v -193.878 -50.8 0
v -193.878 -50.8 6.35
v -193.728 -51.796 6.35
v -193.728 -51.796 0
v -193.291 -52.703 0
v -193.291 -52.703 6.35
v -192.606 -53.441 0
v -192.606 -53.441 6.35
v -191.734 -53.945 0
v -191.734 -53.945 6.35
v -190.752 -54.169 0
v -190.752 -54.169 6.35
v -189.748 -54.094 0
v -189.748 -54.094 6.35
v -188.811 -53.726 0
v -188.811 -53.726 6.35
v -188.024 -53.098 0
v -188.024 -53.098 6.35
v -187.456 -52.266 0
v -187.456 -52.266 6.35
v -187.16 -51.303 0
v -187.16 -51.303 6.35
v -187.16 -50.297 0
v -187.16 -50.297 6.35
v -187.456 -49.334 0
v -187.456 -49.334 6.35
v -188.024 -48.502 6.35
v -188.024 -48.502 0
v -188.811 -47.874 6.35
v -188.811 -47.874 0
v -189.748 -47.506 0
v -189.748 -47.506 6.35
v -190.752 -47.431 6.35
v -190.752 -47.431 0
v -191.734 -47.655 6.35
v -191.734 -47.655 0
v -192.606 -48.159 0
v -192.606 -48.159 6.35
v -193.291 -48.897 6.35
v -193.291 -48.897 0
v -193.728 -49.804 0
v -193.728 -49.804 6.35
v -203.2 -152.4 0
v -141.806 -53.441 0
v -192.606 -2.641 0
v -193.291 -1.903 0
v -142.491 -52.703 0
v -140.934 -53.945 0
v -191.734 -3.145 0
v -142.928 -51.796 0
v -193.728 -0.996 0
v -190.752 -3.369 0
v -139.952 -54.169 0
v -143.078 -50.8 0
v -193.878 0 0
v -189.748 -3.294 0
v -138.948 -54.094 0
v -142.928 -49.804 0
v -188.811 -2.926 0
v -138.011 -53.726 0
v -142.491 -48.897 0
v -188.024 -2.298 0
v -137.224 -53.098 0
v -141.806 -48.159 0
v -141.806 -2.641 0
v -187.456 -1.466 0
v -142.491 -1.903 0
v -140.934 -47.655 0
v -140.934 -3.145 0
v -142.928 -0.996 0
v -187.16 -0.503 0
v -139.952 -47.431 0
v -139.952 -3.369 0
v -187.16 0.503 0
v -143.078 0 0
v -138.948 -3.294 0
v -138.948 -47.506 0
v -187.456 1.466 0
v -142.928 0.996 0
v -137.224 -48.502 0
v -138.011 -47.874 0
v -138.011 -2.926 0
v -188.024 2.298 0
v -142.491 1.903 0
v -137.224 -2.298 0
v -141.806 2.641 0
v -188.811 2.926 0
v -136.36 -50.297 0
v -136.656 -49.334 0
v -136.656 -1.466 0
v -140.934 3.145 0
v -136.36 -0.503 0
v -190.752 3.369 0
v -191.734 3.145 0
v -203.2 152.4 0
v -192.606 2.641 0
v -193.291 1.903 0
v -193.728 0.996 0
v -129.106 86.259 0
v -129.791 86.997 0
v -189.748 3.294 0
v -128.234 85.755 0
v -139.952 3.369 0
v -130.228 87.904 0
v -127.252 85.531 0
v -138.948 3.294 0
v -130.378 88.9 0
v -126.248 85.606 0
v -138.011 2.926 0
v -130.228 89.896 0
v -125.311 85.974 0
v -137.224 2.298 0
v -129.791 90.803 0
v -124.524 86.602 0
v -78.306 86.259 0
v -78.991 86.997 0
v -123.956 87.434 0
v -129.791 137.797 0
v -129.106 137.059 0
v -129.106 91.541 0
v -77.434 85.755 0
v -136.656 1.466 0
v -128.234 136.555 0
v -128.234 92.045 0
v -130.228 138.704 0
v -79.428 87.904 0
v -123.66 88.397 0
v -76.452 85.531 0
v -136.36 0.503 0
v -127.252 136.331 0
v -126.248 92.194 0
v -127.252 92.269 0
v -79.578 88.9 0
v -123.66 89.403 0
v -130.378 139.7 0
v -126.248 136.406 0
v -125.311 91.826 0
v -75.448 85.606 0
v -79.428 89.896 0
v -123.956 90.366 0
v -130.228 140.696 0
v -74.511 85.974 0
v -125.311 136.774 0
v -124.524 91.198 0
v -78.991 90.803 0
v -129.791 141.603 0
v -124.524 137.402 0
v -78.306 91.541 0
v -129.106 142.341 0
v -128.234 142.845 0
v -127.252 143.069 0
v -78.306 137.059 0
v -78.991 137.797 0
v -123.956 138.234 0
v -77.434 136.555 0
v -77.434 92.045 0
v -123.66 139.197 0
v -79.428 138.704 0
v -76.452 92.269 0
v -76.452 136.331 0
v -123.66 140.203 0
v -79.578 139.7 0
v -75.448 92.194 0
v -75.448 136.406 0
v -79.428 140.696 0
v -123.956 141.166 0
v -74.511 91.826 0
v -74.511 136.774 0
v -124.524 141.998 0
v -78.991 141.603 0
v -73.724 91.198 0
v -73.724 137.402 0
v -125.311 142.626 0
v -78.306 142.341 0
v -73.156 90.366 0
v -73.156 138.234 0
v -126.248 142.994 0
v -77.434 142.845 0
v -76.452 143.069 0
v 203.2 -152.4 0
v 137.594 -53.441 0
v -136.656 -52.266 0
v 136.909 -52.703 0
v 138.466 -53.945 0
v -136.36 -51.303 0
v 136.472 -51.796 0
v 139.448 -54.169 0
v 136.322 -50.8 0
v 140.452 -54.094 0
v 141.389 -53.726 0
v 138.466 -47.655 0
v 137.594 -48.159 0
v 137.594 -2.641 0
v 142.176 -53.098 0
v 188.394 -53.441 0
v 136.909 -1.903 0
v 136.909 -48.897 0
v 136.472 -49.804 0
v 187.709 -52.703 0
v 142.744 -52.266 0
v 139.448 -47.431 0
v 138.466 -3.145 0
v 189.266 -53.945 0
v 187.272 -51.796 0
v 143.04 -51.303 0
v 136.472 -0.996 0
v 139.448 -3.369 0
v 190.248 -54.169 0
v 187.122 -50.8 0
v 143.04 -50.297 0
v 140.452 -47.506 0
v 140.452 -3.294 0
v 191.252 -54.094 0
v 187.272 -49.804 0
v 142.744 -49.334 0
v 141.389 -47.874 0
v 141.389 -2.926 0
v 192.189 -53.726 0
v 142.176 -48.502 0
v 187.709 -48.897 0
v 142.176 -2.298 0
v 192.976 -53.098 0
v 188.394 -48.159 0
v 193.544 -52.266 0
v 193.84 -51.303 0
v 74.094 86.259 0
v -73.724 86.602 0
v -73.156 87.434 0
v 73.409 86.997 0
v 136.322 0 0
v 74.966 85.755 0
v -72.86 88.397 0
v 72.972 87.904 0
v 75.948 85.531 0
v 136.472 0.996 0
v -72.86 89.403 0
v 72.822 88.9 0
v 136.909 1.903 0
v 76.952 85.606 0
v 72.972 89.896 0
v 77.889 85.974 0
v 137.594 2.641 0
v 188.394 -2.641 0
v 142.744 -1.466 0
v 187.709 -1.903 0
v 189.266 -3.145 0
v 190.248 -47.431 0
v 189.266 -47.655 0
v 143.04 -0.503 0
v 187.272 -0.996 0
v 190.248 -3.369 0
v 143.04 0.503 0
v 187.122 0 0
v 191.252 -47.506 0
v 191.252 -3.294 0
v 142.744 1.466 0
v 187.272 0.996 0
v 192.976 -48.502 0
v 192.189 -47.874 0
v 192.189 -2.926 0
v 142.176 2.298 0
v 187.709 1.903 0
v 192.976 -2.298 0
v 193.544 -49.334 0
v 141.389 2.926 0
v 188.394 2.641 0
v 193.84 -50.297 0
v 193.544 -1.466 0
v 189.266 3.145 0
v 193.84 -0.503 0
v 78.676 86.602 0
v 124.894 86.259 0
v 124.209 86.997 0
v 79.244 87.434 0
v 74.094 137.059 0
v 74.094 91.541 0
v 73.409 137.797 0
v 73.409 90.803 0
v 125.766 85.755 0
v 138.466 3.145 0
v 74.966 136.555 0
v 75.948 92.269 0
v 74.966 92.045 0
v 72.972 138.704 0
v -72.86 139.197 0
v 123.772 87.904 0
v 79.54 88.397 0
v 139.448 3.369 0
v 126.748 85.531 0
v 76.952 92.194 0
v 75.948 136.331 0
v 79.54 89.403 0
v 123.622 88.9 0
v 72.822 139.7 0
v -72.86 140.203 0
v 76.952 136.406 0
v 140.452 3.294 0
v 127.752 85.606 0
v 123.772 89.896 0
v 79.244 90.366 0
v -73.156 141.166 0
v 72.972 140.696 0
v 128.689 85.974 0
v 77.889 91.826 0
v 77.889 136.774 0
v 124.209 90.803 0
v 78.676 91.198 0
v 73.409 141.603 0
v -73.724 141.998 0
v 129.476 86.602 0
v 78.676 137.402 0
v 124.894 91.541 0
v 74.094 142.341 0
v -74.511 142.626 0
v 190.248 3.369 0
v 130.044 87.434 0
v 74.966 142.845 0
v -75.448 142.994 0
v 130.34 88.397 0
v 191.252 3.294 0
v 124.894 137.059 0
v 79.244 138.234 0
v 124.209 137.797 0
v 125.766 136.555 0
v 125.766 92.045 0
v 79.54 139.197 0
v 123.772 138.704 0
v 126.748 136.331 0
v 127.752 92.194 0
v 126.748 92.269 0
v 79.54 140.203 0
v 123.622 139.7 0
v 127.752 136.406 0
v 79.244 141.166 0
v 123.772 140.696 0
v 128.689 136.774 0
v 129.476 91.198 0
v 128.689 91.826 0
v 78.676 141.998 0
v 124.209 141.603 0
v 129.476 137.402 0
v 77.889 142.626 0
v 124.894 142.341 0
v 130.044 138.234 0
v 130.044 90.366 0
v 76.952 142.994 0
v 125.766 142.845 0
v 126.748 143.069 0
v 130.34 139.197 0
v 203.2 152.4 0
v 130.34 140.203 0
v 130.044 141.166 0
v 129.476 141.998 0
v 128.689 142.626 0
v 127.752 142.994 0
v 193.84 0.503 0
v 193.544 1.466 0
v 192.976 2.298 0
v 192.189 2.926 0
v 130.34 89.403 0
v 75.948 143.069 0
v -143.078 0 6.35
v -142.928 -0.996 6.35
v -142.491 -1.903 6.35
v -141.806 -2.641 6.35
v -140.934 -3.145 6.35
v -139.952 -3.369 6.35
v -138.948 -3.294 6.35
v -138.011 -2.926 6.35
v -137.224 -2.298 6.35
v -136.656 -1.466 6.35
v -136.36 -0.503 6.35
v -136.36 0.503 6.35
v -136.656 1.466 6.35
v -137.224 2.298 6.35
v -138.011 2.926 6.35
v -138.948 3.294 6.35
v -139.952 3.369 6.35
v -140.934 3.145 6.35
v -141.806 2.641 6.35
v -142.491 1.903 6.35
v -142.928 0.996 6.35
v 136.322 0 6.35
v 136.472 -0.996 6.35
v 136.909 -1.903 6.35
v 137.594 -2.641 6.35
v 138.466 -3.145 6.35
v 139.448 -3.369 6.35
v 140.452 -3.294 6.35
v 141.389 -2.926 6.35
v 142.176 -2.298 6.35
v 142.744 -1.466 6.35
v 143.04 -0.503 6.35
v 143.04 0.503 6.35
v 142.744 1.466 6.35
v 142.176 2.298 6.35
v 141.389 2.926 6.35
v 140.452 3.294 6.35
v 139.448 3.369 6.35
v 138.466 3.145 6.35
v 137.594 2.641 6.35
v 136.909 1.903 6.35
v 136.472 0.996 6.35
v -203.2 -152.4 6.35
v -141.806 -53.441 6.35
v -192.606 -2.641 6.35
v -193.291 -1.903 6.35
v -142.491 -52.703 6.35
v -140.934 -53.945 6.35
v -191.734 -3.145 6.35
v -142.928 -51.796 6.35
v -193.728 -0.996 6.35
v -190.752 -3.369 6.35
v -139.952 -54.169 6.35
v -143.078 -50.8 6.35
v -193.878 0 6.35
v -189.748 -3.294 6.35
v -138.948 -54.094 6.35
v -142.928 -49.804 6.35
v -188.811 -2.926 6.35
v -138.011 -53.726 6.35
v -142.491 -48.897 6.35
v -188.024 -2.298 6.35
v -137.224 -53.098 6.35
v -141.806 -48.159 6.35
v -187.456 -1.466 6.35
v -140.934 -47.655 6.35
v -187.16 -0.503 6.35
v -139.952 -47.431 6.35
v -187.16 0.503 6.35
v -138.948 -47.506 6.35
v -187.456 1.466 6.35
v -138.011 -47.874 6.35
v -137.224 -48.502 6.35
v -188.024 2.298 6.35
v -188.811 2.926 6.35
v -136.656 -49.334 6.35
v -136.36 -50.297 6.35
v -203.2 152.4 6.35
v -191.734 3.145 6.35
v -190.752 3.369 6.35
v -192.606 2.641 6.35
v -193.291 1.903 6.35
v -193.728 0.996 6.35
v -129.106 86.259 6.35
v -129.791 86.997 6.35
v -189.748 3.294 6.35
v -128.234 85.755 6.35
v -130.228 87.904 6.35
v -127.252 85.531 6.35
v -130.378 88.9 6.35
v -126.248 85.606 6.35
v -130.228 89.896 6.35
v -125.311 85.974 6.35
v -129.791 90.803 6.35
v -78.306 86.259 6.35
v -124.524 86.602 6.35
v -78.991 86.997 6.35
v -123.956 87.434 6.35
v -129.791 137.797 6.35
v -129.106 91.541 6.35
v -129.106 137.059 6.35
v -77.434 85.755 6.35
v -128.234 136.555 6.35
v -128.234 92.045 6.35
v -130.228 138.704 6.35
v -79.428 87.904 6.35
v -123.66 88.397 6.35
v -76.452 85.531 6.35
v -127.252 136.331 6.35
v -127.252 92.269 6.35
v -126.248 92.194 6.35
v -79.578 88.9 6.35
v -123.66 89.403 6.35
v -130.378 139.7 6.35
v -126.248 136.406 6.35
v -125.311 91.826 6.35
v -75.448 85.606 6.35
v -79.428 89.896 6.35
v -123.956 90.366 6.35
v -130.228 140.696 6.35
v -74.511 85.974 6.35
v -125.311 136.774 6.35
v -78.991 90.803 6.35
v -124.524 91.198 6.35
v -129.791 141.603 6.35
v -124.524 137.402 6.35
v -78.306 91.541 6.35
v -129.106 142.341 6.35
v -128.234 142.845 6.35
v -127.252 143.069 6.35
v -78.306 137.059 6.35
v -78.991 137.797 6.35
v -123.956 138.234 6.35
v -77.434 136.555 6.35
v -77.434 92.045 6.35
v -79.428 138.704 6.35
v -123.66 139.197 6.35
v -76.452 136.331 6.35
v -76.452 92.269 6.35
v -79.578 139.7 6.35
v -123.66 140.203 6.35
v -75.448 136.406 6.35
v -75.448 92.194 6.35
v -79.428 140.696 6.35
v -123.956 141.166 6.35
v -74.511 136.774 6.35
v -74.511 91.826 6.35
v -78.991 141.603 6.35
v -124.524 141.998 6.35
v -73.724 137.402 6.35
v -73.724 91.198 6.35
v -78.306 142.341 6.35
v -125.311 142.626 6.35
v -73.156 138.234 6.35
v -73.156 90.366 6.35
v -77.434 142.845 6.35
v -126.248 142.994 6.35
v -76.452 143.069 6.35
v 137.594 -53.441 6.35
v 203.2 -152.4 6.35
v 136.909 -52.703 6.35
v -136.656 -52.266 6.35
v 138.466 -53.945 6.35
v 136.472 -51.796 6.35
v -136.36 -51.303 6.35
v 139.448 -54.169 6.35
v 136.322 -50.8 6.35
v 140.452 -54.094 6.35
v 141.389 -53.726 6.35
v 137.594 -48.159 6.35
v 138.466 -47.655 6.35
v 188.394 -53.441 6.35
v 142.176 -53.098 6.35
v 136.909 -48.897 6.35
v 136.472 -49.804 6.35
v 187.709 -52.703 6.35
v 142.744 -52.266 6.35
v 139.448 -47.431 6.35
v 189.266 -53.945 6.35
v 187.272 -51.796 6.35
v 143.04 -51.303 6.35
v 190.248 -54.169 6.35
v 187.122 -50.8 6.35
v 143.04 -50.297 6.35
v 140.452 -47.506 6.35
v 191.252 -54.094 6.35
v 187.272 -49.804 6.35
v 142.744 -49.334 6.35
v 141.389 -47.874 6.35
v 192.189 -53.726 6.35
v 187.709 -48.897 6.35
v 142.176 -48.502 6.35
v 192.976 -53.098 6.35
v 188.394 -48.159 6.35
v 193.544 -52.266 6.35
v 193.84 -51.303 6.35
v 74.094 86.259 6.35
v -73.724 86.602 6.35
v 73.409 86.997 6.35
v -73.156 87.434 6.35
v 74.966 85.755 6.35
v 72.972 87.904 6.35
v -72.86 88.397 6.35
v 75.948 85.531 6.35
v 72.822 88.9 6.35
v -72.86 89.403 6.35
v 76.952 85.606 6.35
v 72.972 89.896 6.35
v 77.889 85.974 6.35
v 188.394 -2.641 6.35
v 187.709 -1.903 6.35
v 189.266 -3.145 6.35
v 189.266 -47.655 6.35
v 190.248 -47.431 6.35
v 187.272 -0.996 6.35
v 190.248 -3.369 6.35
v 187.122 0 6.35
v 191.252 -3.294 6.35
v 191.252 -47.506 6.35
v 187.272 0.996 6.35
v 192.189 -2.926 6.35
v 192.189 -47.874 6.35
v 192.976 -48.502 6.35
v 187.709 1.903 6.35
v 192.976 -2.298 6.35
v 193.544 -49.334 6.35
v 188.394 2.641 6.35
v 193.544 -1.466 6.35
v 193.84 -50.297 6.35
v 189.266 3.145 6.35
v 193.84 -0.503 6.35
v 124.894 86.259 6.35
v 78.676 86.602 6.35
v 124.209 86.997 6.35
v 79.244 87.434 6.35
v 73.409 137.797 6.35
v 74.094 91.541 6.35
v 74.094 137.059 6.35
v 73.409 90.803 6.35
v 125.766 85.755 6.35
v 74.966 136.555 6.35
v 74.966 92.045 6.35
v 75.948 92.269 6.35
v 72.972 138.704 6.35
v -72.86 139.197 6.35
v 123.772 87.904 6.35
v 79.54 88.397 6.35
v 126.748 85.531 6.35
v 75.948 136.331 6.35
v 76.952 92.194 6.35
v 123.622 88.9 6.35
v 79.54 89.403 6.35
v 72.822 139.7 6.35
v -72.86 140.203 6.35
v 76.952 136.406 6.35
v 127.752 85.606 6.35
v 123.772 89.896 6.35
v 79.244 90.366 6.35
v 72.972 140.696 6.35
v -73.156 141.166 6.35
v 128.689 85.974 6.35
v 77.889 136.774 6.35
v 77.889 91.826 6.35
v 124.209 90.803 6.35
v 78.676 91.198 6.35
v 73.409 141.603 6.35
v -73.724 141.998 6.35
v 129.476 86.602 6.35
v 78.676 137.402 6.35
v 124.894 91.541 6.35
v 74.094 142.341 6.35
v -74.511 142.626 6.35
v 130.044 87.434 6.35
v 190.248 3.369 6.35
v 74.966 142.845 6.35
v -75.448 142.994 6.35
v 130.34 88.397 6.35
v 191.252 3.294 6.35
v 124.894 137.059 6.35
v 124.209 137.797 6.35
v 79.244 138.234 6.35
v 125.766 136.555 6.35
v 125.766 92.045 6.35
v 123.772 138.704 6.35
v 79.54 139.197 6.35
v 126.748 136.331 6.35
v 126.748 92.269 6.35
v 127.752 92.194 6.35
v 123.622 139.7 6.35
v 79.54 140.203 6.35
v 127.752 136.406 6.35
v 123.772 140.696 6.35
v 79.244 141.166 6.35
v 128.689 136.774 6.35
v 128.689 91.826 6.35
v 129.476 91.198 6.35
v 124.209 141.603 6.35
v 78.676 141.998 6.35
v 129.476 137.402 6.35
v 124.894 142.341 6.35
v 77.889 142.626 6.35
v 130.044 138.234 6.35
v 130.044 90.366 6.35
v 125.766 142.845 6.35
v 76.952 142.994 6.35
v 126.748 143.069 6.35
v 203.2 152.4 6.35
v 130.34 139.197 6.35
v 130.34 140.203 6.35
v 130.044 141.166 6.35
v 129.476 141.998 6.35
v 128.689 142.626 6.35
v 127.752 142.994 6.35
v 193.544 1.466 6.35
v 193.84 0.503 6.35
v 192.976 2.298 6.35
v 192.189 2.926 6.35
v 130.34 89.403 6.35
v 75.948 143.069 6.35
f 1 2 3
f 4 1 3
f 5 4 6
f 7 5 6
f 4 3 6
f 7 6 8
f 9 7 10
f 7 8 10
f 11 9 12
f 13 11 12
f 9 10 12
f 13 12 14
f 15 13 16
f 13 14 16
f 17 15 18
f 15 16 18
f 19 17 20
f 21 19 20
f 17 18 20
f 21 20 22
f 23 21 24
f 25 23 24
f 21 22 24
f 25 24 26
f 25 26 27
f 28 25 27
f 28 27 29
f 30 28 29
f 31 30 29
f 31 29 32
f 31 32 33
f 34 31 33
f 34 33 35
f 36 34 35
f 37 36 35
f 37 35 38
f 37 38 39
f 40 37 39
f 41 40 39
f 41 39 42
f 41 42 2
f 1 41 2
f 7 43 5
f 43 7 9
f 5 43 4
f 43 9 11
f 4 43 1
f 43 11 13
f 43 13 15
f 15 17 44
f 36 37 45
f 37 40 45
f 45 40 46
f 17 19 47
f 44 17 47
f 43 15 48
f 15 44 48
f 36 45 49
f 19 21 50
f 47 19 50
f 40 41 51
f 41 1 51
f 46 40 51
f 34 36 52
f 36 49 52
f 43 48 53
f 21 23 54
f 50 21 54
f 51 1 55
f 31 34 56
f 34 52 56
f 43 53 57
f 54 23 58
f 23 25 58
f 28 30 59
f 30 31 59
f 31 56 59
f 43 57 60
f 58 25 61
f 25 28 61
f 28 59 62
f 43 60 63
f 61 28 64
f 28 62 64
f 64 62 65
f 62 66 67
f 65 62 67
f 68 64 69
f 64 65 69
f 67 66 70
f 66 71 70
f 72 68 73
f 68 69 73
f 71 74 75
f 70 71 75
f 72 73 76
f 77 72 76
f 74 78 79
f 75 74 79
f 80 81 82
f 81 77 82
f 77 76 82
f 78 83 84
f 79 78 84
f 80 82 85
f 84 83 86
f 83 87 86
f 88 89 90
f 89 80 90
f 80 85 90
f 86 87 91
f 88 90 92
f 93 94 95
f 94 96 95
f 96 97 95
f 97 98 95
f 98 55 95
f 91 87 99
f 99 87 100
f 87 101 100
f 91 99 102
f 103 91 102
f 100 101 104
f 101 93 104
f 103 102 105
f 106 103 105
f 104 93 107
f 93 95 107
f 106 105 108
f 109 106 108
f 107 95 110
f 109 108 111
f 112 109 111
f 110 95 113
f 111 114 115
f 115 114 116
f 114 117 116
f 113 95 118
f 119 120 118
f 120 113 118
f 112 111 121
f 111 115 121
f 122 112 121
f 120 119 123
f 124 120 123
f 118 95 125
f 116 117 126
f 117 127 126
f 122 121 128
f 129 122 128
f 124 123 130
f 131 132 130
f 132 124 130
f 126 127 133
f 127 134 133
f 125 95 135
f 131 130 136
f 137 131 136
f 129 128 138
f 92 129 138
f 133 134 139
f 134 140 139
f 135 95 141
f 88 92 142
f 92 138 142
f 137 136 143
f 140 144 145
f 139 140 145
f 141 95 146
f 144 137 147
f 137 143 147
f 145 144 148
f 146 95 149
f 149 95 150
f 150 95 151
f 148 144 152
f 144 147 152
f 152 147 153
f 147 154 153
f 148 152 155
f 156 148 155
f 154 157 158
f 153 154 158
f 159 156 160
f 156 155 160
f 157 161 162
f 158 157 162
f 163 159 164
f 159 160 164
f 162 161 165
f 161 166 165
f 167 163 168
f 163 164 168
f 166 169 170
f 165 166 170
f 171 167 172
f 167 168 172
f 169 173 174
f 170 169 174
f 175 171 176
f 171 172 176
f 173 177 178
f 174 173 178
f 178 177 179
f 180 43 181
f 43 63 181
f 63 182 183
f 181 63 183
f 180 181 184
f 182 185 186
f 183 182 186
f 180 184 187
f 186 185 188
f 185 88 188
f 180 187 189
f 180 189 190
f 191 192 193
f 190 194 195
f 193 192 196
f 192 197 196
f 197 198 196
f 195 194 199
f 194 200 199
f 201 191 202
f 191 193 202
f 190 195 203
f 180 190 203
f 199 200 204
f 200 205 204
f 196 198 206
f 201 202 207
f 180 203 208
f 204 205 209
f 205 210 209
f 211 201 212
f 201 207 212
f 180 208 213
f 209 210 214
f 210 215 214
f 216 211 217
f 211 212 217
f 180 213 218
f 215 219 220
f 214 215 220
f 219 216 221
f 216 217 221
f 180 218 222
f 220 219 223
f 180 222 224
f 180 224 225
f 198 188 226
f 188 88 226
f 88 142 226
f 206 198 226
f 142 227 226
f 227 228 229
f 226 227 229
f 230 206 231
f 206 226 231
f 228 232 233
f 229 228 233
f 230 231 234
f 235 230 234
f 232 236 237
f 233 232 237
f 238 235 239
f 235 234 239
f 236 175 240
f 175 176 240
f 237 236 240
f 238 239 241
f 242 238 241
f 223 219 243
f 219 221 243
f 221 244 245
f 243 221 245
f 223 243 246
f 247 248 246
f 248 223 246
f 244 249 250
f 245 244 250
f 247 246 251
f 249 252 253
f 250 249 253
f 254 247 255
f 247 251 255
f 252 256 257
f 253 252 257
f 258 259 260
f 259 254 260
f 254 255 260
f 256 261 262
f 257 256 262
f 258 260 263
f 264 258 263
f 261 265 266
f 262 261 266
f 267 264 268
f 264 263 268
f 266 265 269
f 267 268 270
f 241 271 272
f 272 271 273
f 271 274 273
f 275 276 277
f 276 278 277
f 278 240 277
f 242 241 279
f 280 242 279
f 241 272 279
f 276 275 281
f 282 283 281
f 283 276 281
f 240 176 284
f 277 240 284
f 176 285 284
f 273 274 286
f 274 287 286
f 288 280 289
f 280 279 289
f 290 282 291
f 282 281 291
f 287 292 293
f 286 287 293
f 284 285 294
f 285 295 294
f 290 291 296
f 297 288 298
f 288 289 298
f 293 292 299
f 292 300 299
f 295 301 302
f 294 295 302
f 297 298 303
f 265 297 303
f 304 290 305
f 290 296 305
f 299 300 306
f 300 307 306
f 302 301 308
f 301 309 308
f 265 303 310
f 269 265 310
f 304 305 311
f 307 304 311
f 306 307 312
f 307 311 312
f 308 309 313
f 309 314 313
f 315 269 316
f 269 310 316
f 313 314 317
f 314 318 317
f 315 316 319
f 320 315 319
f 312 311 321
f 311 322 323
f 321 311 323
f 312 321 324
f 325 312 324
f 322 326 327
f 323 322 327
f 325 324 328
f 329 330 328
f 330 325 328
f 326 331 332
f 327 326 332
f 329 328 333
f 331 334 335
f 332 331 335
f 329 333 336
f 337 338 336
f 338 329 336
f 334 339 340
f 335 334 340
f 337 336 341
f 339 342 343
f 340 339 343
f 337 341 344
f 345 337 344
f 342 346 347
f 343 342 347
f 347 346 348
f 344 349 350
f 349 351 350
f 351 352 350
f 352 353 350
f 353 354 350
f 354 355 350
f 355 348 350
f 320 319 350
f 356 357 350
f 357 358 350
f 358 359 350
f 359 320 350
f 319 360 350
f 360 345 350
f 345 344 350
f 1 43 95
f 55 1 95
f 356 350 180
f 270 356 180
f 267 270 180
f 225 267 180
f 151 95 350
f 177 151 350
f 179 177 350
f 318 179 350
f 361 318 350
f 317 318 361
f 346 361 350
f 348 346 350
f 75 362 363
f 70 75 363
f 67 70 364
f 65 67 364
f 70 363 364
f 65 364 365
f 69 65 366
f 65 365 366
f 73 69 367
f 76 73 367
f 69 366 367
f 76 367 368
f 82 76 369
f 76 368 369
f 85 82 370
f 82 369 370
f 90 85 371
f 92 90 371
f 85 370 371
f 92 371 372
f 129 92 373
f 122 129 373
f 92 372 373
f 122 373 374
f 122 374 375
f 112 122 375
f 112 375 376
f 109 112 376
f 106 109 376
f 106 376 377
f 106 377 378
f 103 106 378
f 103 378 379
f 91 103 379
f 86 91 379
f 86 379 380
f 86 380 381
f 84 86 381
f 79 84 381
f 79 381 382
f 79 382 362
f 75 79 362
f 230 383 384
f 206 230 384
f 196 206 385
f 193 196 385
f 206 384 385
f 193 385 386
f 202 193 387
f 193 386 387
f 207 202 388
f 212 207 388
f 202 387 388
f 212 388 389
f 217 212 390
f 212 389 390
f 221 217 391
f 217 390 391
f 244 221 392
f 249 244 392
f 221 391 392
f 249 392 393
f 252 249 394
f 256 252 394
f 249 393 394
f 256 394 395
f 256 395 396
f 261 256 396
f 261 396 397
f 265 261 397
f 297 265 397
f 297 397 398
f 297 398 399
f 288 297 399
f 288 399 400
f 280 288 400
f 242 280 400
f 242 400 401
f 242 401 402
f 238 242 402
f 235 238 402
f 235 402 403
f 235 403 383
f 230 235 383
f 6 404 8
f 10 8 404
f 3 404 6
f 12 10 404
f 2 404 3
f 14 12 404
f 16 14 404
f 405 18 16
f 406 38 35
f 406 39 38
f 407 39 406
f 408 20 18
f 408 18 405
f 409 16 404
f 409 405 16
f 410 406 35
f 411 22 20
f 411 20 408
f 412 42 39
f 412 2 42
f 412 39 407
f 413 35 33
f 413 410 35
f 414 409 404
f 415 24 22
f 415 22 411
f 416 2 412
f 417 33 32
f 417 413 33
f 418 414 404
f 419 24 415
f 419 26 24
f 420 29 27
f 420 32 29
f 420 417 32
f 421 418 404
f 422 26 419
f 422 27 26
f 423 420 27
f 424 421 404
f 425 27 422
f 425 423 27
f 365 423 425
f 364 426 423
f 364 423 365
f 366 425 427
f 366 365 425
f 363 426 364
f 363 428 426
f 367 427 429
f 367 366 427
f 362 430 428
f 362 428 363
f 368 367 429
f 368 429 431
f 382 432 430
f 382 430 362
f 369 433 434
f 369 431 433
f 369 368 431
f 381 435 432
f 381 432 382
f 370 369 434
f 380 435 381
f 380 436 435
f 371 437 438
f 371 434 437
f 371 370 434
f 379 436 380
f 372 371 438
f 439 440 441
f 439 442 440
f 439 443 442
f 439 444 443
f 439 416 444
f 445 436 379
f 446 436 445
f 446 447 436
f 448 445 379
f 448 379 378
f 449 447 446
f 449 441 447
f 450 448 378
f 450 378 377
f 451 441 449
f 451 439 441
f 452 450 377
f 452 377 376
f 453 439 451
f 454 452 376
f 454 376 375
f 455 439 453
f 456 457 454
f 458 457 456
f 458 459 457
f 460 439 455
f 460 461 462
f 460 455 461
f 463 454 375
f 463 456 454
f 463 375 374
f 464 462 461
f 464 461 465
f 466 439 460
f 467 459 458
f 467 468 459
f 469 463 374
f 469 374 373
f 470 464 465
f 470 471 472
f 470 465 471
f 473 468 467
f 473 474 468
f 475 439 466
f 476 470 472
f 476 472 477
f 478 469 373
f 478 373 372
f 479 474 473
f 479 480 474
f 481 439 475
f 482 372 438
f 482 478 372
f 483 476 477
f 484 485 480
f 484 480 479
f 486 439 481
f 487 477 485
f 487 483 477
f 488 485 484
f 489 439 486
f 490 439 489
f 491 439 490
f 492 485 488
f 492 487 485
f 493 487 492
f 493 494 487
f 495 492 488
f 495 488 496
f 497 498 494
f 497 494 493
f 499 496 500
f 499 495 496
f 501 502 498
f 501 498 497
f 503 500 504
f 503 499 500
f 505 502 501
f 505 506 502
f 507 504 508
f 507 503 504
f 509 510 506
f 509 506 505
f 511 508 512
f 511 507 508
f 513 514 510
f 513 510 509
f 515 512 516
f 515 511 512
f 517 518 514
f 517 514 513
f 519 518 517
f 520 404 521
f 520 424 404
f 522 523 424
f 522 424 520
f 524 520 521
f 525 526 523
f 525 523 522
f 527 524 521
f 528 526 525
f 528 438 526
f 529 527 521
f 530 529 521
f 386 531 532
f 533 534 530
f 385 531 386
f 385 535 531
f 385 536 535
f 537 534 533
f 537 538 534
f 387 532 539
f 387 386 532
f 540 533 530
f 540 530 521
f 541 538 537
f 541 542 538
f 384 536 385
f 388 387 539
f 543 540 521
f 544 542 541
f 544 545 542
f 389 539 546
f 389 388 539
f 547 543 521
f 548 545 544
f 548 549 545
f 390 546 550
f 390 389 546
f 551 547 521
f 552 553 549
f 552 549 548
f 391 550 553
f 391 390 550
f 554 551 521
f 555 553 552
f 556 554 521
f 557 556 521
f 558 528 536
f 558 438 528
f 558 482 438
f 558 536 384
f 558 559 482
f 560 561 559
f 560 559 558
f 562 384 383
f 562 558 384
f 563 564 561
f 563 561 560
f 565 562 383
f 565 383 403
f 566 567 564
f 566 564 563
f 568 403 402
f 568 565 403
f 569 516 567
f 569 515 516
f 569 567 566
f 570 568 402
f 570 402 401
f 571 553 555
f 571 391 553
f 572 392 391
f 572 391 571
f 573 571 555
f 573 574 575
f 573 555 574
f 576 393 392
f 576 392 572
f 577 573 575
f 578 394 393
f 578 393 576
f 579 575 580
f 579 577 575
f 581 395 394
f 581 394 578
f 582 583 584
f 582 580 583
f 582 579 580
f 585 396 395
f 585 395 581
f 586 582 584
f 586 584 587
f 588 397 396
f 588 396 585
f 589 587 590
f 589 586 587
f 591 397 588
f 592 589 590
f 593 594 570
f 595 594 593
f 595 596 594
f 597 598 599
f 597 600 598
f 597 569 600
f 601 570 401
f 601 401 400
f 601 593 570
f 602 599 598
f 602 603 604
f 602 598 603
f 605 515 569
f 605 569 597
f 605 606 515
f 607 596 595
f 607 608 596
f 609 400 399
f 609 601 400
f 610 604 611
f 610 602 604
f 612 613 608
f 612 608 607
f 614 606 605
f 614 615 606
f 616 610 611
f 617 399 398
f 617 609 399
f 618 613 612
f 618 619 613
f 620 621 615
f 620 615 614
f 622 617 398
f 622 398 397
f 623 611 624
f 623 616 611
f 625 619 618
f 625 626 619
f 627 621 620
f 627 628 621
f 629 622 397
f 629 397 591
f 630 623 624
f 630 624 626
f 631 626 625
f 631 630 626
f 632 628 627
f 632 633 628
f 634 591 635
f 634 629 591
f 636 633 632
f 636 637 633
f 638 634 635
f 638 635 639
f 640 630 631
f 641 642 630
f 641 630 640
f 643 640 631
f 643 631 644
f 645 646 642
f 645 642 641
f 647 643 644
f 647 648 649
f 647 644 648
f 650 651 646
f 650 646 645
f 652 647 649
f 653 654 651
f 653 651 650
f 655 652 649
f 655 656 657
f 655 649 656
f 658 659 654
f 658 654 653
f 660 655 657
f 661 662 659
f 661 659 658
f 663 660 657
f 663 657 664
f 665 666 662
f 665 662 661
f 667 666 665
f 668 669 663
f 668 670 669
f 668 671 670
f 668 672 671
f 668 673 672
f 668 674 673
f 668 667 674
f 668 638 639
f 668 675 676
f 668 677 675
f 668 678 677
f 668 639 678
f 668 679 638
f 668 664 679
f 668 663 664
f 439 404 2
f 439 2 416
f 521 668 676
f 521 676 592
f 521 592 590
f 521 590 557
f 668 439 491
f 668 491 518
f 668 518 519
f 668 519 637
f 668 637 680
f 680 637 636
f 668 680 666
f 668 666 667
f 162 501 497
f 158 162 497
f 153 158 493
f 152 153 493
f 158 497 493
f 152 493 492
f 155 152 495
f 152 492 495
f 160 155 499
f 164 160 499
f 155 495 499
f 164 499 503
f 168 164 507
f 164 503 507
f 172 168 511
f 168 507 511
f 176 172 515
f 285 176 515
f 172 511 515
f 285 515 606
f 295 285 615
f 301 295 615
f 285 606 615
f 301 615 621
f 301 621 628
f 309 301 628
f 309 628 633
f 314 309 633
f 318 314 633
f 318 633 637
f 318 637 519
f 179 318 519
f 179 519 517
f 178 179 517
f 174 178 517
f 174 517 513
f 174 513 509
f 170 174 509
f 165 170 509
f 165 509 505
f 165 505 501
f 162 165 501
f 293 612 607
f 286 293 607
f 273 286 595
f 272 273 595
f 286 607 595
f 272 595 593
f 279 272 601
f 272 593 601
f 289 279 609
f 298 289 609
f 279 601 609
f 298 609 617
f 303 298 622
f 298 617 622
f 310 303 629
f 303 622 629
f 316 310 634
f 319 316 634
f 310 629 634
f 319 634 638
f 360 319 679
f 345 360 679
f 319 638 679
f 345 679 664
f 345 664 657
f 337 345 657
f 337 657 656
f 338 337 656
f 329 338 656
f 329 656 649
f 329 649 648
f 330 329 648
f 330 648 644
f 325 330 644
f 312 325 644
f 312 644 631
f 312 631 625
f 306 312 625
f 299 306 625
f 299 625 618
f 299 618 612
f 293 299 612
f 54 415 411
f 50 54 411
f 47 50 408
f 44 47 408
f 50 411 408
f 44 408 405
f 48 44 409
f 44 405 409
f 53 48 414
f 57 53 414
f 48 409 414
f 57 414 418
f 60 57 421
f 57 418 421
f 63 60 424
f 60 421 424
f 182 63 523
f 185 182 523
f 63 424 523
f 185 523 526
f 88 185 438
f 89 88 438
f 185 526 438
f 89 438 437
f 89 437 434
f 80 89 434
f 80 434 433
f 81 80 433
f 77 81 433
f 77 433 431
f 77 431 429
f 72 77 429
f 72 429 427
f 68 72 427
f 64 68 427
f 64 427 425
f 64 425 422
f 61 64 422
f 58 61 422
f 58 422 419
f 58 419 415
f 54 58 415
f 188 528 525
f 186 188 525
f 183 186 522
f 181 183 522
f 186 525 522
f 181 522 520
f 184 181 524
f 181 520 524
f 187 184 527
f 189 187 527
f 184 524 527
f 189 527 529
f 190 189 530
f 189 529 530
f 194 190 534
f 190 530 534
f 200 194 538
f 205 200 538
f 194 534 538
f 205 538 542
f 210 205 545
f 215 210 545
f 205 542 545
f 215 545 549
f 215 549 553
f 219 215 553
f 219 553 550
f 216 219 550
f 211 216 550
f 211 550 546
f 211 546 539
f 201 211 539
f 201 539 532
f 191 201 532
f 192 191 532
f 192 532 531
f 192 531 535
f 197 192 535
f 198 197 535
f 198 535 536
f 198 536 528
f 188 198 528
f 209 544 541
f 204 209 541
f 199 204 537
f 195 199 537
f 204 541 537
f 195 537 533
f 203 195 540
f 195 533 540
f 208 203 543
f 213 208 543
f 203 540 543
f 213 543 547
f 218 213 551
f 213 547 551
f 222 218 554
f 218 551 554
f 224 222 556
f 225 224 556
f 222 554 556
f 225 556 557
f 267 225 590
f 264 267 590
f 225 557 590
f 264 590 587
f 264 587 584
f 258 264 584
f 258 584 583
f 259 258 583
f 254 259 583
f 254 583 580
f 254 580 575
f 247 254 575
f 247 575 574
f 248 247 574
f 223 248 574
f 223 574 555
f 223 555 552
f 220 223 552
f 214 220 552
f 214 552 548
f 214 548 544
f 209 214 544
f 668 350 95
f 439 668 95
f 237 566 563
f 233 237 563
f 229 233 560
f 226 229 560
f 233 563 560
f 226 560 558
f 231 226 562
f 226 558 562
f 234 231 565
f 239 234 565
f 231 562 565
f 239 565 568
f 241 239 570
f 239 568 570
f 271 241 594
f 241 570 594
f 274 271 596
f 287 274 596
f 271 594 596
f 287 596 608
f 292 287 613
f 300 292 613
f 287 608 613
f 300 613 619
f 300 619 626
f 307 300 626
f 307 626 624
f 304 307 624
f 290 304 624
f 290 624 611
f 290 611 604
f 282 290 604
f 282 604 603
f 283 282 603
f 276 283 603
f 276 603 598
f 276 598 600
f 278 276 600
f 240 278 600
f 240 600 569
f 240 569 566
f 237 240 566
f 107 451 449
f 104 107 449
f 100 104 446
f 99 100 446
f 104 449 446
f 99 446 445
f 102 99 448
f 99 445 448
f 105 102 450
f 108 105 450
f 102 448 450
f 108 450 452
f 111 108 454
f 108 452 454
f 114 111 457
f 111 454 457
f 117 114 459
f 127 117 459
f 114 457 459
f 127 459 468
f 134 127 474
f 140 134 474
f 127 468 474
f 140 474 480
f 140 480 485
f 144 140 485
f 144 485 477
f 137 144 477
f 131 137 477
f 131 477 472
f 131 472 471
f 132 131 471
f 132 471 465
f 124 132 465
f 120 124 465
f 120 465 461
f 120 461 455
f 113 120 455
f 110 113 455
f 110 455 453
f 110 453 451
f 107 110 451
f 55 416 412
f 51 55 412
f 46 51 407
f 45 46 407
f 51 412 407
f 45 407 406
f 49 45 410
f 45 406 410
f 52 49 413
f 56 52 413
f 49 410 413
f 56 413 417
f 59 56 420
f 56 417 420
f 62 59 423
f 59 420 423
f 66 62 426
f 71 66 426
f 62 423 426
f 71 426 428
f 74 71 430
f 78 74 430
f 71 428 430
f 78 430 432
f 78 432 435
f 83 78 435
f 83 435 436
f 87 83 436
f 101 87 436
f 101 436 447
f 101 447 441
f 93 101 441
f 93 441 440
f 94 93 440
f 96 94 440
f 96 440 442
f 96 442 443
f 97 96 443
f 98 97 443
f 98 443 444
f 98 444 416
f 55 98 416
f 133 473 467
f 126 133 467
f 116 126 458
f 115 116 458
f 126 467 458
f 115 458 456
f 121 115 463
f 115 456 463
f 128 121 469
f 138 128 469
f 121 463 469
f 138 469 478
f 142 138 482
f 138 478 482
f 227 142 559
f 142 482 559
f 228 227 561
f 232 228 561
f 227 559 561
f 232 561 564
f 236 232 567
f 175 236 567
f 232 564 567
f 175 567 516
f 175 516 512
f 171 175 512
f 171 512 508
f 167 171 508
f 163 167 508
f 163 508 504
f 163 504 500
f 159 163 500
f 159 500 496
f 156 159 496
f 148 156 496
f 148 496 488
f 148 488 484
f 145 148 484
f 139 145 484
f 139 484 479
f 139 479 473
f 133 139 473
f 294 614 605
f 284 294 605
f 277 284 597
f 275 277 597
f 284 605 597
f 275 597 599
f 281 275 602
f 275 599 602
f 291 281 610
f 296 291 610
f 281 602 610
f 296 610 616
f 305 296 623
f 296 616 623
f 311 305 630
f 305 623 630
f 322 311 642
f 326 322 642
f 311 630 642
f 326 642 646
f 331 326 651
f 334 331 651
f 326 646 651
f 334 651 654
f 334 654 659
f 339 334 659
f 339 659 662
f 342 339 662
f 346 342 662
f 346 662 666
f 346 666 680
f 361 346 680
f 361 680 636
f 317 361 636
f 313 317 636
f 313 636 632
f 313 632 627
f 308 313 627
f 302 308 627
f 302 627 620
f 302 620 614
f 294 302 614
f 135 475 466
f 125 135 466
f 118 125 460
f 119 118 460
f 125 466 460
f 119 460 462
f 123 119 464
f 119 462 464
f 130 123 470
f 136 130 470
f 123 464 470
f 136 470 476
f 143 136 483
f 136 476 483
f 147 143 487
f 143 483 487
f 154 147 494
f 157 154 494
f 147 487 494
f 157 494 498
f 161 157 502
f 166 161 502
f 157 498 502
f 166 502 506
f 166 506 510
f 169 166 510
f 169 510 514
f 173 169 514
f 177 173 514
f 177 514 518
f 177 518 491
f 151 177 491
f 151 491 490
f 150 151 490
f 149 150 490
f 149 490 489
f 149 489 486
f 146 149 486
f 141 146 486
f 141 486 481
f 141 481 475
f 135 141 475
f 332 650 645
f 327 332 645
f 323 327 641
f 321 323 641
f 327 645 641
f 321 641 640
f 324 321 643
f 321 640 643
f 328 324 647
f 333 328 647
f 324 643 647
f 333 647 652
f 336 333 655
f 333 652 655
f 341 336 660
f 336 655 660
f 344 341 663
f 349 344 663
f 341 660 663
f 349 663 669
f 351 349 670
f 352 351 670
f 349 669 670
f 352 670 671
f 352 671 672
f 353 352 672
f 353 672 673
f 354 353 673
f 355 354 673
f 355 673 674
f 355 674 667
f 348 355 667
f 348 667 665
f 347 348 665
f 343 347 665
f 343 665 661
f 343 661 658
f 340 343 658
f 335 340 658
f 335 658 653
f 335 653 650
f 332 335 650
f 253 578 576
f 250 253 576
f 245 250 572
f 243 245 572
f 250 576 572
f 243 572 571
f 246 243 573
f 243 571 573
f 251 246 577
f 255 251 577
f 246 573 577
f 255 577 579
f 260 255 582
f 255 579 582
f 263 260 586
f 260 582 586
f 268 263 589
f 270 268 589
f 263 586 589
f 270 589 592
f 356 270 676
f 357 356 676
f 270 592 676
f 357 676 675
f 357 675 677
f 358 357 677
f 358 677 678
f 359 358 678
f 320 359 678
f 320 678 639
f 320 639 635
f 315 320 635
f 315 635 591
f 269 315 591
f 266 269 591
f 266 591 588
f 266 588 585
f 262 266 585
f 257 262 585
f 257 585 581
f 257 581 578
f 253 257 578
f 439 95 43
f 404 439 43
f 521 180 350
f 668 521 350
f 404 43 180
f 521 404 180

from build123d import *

# Parameters (mm, degrees)
F1_DEPTH = 6.35
F2_D     = 6.7564


with BuildPart() as f1:
    # F0 (on Top) → F1 (new body)
    with BuildSketch(Plane.XY):
        Polygon((-190.5, 152.4), (-203.2, 152.4), (-203.2, -152.4), (203.2, -152.4), (203.2, 152.4), (190.5, 152.4), (127, 152.4), (-127, 152.4), align=None)
    extrude(amount=F1_DEPTH)

    # F2 (through all)
    with Locations(Plane(origin=(0, 0, 0), x_dir=(1, 0, 0), z_dir=(0, 0, -1))):
        with Locations((-127, -139.7), (-76.2, -139.7), (-127, -88.9), (-76.2, -88.9), (76.2, -139.7), (127, -139.7), (76.2, -88.9), (127, -88.9), (139.7, 0), (190.5, 0), (139.7, 50.8), (190.5, 50.8), (-190.5, 0), (-139.7, 0), (-139.7, 50.8), (-190.5, 50.8)):
            Hole(F2_D / 2)


solid = f1.part
